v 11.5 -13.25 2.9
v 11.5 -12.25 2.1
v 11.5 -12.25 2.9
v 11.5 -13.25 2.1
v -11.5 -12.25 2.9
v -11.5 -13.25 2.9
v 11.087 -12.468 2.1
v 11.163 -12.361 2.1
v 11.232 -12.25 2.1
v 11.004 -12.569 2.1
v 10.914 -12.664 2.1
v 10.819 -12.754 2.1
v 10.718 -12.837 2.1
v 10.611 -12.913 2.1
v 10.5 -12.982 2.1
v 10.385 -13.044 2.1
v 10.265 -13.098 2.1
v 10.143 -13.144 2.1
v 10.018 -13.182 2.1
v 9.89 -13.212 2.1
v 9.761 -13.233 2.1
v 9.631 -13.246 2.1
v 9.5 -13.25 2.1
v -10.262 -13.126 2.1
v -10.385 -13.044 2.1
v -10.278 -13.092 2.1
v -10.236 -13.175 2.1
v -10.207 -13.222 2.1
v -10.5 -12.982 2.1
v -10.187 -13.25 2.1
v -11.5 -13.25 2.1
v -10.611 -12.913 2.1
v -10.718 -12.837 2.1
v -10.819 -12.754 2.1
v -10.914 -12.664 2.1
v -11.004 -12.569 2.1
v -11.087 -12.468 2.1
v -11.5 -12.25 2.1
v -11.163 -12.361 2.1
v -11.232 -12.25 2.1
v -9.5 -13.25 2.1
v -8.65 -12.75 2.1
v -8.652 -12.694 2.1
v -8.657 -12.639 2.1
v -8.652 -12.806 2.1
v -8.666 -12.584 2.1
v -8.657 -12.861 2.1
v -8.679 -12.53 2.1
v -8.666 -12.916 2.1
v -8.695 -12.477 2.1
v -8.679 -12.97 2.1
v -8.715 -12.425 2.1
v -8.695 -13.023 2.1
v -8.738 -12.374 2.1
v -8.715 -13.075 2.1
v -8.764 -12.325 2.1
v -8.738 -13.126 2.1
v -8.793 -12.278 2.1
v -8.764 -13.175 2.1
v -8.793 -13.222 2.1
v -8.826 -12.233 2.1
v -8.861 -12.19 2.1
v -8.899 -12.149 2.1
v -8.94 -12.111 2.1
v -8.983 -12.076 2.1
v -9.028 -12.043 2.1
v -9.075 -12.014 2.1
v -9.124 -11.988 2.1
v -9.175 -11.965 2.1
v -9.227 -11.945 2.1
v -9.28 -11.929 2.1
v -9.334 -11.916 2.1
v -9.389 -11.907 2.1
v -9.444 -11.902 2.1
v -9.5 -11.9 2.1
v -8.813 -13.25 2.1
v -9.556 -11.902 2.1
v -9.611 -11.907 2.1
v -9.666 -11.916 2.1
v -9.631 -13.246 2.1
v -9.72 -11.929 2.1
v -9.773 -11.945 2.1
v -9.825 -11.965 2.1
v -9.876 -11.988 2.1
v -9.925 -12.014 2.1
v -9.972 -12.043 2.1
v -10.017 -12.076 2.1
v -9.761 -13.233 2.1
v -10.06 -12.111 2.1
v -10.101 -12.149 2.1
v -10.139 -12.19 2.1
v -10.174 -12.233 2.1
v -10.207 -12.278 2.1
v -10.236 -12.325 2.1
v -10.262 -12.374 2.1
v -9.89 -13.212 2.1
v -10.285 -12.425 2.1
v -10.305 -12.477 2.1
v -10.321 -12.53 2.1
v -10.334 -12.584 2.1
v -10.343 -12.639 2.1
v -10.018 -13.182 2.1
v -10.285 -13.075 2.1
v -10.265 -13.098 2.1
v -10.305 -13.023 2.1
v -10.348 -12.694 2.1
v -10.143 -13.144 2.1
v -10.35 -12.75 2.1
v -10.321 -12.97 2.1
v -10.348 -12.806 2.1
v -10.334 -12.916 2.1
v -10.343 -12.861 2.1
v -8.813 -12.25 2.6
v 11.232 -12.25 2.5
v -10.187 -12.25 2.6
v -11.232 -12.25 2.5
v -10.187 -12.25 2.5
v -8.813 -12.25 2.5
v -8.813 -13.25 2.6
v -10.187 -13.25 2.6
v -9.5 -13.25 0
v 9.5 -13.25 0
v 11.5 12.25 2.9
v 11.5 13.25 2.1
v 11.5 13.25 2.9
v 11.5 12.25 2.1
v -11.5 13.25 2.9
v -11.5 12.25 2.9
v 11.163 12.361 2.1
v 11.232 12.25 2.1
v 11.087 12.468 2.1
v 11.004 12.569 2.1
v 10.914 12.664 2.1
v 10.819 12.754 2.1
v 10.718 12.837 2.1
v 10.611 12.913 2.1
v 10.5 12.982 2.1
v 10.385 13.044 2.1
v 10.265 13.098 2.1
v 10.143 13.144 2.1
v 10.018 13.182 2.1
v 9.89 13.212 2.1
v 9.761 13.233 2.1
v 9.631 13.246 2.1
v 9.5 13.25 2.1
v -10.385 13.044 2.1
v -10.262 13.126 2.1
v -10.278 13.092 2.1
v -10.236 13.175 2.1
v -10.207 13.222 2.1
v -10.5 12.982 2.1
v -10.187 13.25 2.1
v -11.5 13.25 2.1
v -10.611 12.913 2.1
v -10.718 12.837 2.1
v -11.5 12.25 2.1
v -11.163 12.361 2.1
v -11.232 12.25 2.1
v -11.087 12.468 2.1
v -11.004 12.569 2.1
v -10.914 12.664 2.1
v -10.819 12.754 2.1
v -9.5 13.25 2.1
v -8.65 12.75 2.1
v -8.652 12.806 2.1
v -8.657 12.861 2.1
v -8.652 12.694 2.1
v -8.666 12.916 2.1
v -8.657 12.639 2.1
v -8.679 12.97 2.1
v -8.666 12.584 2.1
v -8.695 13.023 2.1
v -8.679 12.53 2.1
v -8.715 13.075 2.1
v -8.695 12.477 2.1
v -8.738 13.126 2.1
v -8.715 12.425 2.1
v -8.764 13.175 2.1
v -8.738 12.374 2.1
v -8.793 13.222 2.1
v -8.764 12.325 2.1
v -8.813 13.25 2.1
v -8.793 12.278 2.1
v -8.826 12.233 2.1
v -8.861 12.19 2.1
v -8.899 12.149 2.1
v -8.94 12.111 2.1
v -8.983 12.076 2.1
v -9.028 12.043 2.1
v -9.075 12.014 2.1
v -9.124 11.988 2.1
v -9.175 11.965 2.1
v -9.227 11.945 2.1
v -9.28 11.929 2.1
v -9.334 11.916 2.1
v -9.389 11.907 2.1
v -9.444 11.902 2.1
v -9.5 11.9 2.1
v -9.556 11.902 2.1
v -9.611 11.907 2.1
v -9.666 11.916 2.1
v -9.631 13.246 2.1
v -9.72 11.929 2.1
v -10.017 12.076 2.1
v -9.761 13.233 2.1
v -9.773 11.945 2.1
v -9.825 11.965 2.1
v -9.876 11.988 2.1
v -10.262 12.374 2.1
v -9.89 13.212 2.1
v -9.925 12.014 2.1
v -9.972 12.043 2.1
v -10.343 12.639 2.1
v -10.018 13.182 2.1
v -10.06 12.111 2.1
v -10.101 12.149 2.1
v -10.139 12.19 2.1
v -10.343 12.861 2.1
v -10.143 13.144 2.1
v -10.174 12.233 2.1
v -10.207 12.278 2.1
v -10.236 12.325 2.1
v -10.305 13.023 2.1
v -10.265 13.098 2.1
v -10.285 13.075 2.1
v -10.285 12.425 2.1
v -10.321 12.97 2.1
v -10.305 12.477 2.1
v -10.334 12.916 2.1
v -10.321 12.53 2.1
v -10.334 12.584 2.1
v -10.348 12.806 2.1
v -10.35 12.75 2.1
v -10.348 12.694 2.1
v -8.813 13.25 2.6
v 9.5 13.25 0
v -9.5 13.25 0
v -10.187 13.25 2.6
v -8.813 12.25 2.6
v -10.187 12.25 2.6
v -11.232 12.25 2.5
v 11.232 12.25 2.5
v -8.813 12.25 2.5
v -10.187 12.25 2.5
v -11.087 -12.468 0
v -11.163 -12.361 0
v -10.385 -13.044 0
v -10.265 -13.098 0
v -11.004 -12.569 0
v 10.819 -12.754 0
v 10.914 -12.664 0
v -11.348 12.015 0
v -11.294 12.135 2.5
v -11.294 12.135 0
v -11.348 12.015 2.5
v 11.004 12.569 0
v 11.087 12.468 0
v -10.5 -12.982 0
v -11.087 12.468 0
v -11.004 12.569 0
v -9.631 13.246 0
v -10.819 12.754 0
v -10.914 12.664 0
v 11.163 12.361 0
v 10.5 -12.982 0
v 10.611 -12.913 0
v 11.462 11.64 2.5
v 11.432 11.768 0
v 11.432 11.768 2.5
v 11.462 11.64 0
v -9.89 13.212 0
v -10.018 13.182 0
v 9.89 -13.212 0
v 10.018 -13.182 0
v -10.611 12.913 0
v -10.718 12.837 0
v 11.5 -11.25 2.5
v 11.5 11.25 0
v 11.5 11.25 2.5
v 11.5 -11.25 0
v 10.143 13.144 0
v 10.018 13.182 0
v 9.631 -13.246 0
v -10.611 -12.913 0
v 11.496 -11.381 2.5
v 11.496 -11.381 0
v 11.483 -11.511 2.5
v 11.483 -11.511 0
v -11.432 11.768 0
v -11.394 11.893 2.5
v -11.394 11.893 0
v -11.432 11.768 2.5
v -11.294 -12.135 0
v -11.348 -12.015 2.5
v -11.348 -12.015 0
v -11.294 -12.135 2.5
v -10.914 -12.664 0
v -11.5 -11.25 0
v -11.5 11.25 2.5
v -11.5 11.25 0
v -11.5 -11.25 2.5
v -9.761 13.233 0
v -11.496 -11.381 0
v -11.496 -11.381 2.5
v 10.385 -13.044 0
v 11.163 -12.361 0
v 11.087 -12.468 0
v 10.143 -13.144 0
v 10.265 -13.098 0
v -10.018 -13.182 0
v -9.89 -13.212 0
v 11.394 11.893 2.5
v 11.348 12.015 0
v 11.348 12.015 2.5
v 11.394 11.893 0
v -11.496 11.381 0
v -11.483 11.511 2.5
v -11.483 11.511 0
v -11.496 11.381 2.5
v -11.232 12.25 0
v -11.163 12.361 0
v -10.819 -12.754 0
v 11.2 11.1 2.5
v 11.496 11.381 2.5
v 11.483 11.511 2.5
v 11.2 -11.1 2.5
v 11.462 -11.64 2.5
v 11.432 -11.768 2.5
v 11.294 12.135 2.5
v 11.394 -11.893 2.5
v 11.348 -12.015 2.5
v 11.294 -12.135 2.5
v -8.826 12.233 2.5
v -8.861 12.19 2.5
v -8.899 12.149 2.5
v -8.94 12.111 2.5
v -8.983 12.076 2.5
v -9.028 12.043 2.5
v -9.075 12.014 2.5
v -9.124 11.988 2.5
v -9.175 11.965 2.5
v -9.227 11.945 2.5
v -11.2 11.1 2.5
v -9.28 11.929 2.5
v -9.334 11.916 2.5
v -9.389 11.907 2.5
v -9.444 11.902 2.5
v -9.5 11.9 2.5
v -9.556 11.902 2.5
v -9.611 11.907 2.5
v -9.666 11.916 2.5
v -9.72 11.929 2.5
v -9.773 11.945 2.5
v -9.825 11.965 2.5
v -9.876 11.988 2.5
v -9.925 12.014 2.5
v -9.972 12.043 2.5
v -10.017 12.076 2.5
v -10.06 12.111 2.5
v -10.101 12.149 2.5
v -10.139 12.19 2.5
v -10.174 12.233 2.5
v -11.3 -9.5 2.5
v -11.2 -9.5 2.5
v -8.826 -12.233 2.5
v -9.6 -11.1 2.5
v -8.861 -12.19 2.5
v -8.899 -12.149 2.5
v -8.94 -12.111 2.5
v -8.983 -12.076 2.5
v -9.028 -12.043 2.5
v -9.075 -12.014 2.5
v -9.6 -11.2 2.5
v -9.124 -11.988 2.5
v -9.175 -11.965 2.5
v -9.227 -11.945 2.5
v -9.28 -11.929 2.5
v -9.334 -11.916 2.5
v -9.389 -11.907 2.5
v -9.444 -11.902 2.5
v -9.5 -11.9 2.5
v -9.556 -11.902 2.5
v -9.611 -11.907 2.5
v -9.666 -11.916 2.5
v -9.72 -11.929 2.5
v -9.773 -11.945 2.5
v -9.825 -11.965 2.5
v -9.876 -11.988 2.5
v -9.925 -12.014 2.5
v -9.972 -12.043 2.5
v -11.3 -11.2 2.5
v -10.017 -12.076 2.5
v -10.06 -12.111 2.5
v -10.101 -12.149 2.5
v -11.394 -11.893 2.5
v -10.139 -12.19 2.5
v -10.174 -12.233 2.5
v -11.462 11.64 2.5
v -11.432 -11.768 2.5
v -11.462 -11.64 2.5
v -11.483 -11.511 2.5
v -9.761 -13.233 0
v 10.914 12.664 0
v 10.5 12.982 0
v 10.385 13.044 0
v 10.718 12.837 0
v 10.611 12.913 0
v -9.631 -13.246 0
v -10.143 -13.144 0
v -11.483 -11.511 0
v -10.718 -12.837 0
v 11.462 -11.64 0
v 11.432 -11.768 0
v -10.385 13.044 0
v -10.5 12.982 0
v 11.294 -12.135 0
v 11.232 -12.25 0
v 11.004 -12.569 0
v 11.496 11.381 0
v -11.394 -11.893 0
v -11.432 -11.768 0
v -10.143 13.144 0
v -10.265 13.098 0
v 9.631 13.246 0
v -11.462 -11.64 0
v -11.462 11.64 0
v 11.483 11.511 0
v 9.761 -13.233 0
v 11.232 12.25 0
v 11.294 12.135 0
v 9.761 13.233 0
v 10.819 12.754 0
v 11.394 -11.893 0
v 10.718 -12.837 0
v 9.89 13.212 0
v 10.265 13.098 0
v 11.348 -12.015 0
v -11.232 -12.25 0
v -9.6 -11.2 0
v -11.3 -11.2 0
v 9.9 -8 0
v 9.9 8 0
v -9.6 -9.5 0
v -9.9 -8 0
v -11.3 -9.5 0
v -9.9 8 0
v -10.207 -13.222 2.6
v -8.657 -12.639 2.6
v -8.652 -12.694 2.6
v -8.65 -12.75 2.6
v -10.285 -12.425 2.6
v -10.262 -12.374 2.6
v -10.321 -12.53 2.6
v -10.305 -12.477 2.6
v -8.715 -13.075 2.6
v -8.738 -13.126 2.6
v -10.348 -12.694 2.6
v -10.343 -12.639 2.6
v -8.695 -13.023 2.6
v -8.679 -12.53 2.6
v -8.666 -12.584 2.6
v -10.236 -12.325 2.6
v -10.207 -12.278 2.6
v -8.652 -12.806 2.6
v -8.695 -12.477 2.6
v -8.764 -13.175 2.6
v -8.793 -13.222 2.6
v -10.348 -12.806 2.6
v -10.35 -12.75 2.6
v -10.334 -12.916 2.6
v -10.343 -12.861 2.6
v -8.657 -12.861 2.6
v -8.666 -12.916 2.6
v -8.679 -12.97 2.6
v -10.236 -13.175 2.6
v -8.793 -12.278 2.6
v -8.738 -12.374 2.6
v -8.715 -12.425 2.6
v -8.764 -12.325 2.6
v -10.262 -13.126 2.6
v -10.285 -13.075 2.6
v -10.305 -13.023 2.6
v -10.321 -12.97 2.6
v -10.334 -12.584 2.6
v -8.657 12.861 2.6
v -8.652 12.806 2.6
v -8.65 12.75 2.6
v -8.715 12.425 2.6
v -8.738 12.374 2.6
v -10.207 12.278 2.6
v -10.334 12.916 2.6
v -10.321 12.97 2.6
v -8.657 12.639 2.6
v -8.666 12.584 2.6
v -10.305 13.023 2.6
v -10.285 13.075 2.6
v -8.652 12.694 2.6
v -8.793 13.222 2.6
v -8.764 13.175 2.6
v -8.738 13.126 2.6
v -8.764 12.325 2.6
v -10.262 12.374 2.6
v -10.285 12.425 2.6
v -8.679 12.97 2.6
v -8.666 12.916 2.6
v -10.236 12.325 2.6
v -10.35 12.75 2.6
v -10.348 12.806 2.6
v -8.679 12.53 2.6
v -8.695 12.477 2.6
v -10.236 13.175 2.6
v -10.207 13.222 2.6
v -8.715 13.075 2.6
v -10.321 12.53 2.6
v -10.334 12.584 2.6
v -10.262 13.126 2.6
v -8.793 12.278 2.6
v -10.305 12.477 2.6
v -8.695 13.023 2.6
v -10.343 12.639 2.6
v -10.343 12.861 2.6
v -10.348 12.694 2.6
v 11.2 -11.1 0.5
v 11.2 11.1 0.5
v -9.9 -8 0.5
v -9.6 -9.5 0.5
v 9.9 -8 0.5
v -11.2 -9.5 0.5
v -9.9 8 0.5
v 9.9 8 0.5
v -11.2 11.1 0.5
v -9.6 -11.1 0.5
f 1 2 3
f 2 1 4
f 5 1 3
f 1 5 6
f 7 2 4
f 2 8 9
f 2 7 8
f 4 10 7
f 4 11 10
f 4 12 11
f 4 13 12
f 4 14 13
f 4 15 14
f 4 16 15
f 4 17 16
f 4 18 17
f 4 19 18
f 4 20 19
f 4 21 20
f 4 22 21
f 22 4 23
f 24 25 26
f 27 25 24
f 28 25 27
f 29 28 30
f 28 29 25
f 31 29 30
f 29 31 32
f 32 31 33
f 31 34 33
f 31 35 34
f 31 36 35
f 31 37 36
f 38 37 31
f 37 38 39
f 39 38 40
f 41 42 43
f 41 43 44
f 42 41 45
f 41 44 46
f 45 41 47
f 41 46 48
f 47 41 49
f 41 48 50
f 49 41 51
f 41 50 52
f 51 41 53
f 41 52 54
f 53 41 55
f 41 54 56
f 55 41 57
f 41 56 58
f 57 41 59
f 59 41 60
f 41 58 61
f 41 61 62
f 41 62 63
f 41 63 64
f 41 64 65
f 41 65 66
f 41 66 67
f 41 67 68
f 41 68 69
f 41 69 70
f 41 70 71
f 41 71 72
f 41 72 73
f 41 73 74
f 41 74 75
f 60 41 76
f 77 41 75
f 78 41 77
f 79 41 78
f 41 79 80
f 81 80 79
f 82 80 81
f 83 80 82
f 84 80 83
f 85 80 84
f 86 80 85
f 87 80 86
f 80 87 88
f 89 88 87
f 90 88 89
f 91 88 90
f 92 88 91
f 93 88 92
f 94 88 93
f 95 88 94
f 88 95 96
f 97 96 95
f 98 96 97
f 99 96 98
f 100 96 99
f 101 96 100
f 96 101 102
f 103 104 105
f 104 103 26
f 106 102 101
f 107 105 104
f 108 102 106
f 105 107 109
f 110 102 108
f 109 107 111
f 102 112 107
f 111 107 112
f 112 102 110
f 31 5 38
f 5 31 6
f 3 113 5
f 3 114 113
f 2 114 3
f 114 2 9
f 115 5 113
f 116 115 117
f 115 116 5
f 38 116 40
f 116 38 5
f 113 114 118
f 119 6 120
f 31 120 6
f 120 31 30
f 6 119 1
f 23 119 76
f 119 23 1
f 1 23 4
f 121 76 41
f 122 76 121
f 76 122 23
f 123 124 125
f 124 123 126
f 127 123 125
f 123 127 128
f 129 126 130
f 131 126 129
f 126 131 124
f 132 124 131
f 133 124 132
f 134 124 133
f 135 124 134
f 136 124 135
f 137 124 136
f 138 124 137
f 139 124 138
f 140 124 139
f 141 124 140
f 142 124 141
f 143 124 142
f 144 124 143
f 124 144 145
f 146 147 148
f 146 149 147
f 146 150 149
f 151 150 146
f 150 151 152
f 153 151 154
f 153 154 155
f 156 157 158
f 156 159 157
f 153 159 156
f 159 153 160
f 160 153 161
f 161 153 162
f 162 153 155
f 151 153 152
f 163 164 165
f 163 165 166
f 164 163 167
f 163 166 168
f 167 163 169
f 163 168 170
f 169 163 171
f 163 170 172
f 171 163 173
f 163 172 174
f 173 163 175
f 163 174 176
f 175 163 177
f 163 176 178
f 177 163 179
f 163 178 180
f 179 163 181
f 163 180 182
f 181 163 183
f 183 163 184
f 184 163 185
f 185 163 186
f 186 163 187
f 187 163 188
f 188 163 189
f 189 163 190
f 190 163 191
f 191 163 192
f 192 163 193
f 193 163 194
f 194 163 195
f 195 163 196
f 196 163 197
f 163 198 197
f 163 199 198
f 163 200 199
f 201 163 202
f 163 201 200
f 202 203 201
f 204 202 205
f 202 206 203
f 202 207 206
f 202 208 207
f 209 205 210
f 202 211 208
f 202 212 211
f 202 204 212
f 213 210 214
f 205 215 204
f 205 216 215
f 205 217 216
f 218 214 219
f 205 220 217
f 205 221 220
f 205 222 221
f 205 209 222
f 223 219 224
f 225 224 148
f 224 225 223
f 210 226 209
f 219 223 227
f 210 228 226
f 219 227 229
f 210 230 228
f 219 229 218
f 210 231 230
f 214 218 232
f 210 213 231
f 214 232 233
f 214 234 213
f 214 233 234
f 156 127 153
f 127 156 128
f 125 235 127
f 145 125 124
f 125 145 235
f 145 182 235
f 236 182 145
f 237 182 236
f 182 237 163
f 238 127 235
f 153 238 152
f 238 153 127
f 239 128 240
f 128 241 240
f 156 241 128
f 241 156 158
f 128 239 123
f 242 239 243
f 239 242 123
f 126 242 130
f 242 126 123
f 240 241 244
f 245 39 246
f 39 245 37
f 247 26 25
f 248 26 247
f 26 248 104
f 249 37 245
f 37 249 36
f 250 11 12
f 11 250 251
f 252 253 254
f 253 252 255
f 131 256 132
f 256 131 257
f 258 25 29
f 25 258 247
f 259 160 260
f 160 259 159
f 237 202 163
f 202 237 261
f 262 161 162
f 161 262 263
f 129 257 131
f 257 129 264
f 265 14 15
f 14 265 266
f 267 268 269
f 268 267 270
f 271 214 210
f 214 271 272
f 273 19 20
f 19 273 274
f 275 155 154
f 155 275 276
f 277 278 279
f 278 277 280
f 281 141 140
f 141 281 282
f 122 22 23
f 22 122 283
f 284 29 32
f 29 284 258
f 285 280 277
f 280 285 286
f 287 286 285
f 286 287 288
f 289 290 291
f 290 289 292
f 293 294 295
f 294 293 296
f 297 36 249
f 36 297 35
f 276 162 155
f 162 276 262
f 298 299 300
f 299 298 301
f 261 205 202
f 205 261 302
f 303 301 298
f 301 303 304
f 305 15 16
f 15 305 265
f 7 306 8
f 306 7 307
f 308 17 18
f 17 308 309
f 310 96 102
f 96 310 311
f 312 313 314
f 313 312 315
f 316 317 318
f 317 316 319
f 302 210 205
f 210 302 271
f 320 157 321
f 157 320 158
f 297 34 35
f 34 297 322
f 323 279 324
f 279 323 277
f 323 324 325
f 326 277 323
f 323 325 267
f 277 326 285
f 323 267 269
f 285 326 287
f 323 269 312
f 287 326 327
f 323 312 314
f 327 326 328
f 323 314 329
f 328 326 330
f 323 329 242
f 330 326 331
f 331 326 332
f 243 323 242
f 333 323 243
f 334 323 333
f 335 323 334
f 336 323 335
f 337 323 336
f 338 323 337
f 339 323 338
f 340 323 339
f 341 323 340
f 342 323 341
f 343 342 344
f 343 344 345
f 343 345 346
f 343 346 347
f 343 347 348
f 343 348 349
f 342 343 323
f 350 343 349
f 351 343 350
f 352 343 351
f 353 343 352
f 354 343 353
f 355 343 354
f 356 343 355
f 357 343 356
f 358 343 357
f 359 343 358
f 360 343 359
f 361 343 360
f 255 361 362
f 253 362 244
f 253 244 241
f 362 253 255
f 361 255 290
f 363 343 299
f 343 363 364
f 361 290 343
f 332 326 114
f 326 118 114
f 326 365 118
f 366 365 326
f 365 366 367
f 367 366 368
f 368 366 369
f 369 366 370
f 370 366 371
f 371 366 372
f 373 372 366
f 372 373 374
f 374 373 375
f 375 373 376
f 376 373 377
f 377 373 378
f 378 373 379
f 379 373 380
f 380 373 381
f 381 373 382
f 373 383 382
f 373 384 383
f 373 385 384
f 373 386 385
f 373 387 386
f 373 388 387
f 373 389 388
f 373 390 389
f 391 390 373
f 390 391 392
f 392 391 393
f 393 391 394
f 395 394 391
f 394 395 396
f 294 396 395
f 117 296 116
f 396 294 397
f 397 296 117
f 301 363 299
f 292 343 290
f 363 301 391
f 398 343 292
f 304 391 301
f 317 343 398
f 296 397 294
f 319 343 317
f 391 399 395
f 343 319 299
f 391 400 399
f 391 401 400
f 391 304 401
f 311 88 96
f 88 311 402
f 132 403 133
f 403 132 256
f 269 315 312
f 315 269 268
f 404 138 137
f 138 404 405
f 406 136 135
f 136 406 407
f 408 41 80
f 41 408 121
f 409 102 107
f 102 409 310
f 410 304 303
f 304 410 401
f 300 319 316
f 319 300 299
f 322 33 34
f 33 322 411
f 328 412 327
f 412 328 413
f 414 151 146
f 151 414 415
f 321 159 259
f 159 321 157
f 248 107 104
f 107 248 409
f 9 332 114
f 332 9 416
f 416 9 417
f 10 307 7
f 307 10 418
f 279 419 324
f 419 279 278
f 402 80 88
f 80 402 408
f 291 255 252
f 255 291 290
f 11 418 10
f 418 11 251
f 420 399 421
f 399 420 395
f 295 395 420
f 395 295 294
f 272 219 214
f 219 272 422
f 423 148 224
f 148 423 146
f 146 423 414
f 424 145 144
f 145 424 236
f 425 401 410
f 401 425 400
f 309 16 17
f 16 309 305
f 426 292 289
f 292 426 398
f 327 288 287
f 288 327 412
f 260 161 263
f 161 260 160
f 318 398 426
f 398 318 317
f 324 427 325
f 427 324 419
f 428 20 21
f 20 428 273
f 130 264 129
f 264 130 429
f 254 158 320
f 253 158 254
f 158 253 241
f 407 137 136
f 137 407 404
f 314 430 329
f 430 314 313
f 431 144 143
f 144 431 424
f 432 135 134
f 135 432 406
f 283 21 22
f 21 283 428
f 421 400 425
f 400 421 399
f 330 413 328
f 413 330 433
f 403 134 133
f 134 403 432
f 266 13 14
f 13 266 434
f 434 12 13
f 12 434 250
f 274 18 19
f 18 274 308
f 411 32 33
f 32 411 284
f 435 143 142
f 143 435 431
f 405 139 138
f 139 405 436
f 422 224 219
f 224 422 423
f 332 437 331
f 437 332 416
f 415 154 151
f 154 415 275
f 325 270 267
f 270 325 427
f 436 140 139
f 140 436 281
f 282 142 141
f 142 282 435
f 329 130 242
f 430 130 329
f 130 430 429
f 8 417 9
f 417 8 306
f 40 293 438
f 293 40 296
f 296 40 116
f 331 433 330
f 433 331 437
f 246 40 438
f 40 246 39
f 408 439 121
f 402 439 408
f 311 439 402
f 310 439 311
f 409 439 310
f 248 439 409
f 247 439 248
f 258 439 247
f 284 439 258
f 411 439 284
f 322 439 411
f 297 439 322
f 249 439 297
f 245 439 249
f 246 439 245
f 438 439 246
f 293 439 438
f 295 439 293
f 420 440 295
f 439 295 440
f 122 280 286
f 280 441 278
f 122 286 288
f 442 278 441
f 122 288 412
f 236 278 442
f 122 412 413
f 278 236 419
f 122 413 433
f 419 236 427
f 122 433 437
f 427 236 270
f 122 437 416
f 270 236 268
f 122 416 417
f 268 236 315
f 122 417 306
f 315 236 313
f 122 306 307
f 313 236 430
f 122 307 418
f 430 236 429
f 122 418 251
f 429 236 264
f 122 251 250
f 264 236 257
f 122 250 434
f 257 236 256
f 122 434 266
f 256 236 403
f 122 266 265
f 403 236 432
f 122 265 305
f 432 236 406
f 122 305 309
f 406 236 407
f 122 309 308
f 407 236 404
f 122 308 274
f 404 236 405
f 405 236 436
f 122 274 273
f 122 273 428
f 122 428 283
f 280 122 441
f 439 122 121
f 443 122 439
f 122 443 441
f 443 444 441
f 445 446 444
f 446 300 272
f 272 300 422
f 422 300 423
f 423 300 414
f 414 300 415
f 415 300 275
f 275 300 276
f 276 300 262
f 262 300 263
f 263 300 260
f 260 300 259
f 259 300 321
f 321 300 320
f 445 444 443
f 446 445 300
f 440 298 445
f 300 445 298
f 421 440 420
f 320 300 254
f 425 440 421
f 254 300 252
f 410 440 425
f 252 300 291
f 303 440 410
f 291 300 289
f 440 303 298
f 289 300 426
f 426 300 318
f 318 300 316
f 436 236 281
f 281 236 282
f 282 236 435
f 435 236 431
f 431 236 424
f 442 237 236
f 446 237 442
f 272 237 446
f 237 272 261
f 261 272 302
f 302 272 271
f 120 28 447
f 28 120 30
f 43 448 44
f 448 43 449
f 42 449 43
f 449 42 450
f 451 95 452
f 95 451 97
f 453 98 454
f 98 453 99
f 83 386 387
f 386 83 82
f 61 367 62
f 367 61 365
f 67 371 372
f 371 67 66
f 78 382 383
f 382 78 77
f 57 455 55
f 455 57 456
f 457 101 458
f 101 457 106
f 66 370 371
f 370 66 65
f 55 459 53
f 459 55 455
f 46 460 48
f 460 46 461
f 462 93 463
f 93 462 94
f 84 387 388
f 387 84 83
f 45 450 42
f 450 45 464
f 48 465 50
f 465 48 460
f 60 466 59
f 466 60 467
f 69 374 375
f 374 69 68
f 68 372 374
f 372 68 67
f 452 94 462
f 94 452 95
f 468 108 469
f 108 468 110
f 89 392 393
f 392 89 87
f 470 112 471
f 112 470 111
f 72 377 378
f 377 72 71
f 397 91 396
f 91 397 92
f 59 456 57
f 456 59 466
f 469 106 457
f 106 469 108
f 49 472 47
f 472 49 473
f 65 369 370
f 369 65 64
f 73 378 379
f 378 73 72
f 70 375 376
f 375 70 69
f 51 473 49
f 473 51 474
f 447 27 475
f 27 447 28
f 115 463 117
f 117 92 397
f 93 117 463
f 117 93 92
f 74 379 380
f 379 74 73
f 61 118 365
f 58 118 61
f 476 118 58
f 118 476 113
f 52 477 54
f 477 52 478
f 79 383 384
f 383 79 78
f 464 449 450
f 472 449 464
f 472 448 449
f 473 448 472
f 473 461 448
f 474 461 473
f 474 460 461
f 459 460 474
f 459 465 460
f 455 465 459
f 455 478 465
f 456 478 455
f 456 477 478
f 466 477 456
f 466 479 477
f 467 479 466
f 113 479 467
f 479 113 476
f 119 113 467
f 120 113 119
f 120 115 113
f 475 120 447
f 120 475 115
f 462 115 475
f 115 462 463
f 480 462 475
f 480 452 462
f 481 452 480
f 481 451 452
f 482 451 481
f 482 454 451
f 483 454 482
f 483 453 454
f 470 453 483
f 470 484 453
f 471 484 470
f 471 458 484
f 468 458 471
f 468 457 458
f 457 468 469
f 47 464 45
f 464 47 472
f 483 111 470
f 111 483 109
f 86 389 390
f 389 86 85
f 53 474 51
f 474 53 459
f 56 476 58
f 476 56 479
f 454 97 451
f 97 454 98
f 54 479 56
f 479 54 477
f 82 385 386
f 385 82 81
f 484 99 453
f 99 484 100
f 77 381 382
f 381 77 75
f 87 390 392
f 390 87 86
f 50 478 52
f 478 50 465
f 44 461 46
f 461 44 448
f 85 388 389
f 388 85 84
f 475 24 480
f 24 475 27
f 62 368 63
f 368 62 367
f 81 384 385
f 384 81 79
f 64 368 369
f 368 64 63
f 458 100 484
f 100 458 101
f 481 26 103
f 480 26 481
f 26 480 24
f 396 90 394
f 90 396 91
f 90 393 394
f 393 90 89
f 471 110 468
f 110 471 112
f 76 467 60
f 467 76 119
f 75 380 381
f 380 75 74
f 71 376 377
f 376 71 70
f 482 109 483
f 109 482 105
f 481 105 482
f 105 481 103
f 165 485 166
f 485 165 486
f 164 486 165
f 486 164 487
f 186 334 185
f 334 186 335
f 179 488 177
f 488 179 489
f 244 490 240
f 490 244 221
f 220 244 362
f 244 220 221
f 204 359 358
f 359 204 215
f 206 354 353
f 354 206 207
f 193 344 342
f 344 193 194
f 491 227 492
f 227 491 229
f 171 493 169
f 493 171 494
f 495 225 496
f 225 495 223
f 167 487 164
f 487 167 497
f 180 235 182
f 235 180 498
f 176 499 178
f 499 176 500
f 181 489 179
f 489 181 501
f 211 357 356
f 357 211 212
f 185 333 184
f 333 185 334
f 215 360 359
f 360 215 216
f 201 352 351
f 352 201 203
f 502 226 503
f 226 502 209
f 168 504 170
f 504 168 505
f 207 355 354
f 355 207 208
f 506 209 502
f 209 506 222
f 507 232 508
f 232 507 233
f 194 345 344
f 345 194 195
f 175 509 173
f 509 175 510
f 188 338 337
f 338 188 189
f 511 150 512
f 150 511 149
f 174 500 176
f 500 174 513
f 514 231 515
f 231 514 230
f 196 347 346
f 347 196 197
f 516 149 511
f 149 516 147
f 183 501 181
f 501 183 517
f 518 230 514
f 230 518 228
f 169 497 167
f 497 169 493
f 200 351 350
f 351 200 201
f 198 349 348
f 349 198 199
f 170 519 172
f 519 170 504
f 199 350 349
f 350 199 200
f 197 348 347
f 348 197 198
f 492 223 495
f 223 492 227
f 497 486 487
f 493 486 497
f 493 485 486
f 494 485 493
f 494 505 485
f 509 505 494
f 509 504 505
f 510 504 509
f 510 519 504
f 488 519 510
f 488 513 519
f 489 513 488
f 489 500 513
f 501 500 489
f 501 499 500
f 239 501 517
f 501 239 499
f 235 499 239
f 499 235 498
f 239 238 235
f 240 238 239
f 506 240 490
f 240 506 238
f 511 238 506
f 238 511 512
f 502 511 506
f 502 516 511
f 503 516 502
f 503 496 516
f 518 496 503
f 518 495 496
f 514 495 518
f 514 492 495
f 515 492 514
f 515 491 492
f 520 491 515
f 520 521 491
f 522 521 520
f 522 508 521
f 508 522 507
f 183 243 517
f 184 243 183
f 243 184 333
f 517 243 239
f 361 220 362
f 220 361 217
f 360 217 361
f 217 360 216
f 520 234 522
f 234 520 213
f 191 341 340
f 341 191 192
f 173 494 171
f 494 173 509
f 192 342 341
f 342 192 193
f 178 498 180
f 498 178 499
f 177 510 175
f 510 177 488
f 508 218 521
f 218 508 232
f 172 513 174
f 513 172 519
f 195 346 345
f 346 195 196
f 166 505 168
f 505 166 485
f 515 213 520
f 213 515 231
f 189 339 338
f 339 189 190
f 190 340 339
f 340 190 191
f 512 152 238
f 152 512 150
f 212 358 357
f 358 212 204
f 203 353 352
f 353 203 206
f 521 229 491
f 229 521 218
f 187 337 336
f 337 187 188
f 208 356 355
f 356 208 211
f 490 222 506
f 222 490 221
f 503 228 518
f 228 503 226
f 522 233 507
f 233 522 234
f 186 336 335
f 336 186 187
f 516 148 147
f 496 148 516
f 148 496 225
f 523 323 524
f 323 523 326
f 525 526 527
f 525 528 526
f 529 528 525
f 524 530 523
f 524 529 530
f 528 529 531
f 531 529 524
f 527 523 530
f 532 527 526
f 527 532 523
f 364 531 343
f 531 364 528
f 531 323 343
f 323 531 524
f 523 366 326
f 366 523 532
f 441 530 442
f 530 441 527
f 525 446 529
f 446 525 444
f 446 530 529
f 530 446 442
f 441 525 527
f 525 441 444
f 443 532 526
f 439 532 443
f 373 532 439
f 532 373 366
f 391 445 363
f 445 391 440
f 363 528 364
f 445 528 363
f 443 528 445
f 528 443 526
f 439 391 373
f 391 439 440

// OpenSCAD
// =============================================================================
// bottom_shell.scad — CortiPod minimal electrode tray
//
// Slides into the top shell's U-channel rails from +Y. The electrode PCB
// drops into the pocket from above (sensing face down). Lips on ±Y edges
// are captured by the top shell rails. Detent dimples on the bottom face
// of each lip (Z-axis dimples) snap against bumps in the rail channel floor
// when fully seated.
//
// No strap lugs, no GSR pads, no vent grooves, no alignment pins,
// no snap clip receivers, no insertion opening.
//
// Print: skin-side DOWN for smooth bottom surface.
// =============================================================================

include <parameters.scad>

$fn = $preview ? 32 : 96;

// ---- Main module ----
module bottom_shell() {
    difference() {
        union() {
            tray_body();
            tray_lips();
        }
        electrode_pocket();
        skin_window();
        orientation_key();
        tray_detent_recesses();
    }
}

// ---- Tray body ----
// Solid rounded-rect block sized to the tray footprint.
module tray_body() {
    r = min(pod_corner_radius, 2.0);
    hull() {
        for (x = [-tray_width/2 + r, tray_width/2 - r])
            for (y = [-tray_length/2 + r, tray_length/2 - r])
                translate([x, y, 0])
                    cylinder(r=r, h=tray_height);
    }
}

// ---- Tray lips ----
// Thin protrusions on the ±Y edges that slide into the top shell U-channels.
// Positioned at the top of the tray body (Z = tray_height), extending upward.
module tray_lips() {
    for (y_sign = [-1, 1]) {
        y_pos = y_sign * (tray_length/2 - tray_lip_thickness/2);
        translate([0, y_pos, tray_height])
            cube([tray_width, tray_lip_thickness, tray_lip_height], center=true);
    }
}

// ---- Electrode pocket ----
// Recessed cavity cut from the top that receives the dual electrode PCB.
// Floor of the pocket sits at Z = ledge_height (the electrode support ledge).
module electrode_pocket() {
    pocket_z = ledge_height;
    translate([-slot_width/2, -slot_depth/2, pocket_z])
        cube([slot_width, slot_depth, tray_height - pocket_z + 0.1]);
}

// ---- Skin window ----
// Through-hole from the bottom face exposing the sensing pads to skin/sweat.
module skin_window() {
    translate([-skin_window_width/2, -skin_window_length/2, -0.1])
        cube([skin_window_width, skin_window_length, tray_height + 0.2]);
}

// ---- Orientation key ----
// Corner notch at one pocket corner matching the electrode board's chamfer.
// Prevents MIP/NIP orientation swap during assembly.
module orientation_key() {
    translate([-slot_width/2 - 0.1,
               -slot_depth/2 - 0.1,
               -0.1])
        cube([chamfer_size + 0.2,
              chamfer_size + 0.2,
              tray_height + 0.2]);
}

// ---- Tray detent recesses ----
// Upward-facing dimples on the bottom face of each lip (Z-axis, matching the
// bump axis). The bump on the top shell channel floor protrudes upward (+Z);
// these recesses are drilled from Z = tray_height downward into the lip base.
// X position matches the bump X (detent_position from the -Y hard stop).
// Diameter and depth include clearance for a positive snap fit.
module tray_detent_recesses() {
    recess_d     = detent_bump_diameter + 0.2;
    recess_depth = detent_bump_height + 0.1;

    // X position: same as bump_x in top_shell.scad
    recess_x = -pod_length/2 + wall_thickness + detent_position;

    for (y_sign = [-1, 1]) {
        // Y center of the lip
        lip_y = y_sign * (tray_length/2 - tray_lip_thickness/2);

        // Drill downward from the bottom face of the lip (Z = tray_height)
        translate([recess_x, lip_y, tray_height - recess_depth])
            cylinder(d=recess_d, h=recess_depth + 0.1);
    }
}

// ---- Render ----
bottom_shell();
